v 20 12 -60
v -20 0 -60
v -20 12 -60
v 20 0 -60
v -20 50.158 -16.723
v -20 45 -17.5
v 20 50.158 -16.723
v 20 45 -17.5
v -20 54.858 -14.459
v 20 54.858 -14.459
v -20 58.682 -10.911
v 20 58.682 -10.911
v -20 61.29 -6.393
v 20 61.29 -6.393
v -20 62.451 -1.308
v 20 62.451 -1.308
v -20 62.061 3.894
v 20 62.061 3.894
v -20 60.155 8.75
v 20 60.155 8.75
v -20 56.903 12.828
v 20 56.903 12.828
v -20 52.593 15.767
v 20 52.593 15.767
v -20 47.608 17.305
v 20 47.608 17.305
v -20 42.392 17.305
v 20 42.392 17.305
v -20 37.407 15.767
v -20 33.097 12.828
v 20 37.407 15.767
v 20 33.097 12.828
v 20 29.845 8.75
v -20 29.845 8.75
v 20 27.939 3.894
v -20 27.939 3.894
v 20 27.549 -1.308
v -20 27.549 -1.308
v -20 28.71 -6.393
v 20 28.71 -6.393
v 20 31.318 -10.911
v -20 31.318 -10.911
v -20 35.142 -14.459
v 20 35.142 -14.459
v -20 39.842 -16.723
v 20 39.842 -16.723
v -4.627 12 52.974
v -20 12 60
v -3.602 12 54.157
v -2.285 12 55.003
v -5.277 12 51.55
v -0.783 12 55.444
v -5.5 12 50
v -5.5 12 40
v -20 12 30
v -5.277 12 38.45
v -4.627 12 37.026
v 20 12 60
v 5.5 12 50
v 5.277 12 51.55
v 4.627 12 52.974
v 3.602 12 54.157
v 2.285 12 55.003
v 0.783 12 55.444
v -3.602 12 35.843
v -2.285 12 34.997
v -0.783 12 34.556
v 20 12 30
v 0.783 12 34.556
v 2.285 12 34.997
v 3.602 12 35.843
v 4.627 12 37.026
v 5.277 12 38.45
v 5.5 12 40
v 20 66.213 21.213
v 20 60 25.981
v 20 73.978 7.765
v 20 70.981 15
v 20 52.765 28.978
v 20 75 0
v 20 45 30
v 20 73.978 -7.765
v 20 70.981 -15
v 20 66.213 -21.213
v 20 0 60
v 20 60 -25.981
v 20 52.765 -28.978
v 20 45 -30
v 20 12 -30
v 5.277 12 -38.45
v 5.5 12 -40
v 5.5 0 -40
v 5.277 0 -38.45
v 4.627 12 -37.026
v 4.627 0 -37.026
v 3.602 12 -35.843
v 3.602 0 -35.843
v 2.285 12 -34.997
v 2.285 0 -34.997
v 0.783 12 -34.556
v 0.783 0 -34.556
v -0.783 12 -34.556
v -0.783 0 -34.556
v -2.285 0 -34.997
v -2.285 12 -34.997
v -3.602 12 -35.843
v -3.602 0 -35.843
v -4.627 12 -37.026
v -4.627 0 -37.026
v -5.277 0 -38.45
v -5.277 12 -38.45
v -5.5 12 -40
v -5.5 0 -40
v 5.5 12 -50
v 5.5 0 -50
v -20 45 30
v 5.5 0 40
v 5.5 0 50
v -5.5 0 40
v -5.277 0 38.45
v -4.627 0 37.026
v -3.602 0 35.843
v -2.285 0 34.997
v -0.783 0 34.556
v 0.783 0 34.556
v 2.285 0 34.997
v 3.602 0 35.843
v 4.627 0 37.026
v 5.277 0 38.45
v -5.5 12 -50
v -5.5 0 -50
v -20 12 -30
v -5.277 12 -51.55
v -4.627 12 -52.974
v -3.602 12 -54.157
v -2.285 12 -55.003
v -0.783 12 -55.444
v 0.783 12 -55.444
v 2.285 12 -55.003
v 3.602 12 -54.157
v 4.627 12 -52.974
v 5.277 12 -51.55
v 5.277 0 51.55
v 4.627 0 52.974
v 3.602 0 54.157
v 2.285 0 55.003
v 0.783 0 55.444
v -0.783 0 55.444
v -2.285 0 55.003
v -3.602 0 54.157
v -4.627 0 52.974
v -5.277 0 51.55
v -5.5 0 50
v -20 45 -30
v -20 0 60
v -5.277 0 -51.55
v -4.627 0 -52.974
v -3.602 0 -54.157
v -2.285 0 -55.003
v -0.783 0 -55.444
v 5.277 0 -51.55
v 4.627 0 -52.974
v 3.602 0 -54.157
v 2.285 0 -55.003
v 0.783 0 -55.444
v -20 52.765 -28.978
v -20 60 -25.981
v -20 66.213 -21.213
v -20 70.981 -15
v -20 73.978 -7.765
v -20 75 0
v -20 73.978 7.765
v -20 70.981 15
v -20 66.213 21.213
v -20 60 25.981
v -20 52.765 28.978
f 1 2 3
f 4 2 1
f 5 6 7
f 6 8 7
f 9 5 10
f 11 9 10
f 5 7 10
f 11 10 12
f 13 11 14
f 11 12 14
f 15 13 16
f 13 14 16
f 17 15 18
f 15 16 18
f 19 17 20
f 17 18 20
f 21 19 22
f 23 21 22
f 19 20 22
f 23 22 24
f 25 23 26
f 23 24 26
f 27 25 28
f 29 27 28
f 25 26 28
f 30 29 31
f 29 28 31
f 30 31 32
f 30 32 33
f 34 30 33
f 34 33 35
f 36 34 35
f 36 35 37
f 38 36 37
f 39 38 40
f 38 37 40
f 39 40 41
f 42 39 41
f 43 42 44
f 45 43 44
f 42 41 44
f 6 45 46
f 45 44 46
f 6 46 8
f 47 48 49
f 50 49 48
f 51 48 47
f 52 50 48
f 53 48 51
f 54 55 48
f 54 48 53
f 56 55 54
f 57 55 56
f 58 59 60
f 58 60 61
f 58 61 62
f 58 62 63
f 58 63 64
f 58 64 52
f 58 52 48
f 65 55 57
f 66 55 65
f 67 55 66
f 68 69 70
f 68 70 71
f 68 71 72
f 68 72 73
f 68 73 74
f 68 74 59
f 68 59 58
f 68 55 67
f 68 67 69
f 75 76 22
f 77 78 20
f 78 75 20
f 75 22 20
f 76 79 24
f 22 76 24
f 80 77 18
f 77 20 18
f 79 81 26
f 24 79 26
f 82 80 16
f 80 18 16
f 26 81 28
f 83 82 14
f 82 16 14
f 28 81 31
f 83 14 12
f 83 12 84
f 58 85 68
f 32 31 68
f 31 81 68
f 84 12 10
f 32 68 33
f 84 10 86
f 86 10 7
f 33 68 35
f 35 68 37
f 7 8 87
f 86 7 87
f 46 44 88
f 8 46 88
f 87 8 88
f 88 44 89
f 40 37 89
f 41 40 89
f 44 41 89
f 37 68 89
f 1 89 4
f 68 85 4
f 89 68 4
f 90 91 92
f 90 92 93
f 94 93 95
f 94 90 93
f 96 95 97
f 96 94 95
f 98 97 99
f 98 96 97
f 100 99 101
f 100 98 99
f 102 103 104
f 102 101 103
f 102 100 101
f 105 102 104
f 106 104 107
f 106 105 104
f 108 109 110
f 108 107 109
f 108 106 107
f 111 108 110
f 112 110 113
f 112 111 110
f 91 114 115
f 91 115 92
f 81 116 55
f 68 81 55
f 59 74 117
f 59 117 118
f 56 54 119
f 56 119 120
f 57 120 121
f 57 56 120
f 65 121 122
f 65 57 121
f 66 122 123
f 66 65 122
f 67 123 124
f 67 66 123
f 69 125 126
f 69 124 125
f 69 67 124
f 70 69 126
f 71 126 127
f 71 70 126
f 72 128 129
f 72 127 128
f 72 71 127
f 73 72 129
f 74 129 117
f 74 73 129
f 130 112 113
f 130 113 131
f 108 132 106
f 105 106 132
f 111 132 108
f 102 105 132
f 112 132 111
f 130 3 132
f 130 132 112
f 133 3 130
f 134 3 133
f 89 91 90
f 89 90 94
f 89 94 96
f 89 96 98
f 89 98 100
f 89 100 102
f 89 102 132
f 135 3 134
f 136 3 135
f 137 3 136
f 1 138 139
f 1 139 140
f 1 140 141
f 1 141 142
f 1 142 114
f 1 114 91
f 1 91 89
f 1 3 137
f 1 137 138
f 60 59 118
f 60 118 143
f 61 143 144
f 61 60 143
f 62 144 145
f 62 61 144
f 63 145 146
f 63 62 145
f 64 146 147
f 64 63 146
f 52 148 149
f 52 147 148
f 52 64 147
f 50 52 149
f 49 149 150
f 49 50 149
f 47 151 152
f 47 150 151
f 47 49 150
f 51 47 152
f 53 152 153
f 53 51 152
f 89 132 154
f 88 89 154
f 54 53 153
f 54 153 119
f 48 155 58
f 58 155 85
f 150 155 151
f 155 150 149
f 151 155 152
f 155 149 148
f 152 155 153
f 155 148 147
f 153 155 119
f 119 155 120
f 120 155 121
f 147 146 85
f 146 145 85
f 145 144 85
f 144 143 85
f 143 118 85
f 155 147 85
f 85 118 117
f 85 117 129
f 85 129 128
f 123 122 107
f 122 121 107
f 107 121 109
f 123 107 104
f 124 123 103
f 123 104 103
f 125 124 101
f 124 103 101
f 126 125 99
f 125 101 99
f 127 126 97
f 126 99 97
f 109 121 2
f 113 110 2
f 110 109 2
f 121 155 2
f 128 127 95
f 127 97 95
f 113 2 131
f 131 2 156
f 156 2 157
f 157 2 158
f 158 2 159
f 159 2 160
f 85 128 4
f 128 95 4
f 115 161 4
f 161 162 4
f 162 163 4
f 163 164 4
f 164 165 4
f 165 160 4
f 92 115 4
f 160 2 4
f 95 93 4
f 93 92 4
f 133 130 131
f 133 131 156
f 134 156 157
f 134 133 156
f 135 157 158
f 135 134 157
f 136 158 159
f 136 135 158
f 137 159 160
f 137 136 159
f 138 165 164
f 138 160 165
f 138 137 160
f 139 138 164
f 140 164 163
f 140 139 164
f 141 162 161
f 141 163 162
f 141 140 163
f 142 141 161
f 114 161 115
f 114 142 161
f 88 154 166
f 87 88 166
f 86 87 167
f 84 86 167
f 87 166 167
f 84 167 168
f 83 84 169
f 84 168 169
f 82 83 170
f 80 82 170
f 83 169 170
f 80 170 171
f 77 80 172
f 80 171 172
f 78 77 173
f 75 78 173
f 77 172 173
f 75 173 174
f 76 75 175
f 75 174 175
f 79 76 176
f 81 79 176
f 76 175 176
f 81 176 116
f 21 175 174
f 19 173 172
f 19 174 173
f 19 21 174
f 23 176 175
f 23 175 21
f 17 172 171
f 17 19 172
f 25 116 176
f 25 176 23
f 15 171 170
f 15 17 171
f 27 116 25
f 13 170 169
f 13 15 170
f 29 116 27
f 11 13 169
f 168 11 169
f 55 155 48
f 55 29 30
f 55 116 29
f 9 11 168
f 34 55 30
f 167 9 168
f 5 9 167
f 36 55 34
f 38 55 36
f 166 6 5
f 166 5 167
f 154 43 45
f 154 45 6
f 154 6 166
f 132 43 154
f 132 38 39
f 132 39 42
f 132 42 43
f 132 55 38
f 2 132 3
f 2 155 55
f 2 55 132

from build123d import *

# Parameters (mm, degrees)
SKETCH_1_W          = 40
SKETCH_1_H          = 120
EXTRUDE_1_DEPTH     = 12
EXTRUDE_2_DEPTH     = 40
SKETCH_3_R          = 17.5
CUT_EXTRUDE_1_DEPTH = 121
CUT_EXTRUDE_2_DEPTH = 90.269255626


with BuildPart() as part:
    # 草图1 → 凸台-拉伸1 (new body)
    with BuildSketch(Plane(origin=(0, 0, 0), x_dir=(1, 0, 0), z_dir=(0, 1, 0))):
        Rectangle(SKETCH_1_W, SKETCH_1_H)
    extrude(amount=EXTRUDE_1_DEPTH)

    # 草图2 → 凸台-拉伸2 (add)
    with BuildSketch(Plane(origin=(-20, 0, 0), x_dir=(0, 0, -1), z_dir=(1, 0, 0))):
        with BuildLine():
            Line((30, 10), (30, 45))
            ThreePointArc((30, 45), (0, 75), (-30, 45))
            Line((-30, 45), (-30, 10))
            Line((-30, 10), (30, 10))
        make_face()
    extrude(amount=EXTRUDE_2_DEPTH)

    # 草图3 → 切除-拉伸1 (cut, symmetric)
    with BuildSketch(Plane(origin=(0, 0, 0), x_dir=(0, 0, -1), z_dir=(1, 0, 0))):
        with Locations((0, 45)):
            Circle(SKETCH_3_R)
    extrude(amount=CUT_EXTRUDE_1_DEPTH, both=True, mode=Mode.SUBTRACT)

    # 草图4 → 切除-拉伸2 (cut, through all)
    with BuildSketch(Plane(origin=(0, 12, 0), x_dir=(1, 0, 0), z_dir=(0, 1, 0))):
        with BuildLine():
            Line((5.5, -40), (5.5, -50))
            ThreePointArc((5.5, -50), (0, -55.5), (-5.5, -50))
            Line((-5.5, -50), (-5.5, -40))
            ThreePointArc((-5.5, -40), (0, -34.5), (5.5, -40))
        make_face()
        with BuildLine():
            Line((5.5, 50), (5.5, 40))
            ThreePointArc((5.5, 40), (0, 34.5), (-5.5, 40))
            Line((-5.5, 40), (-5.5, 50))
            ThreePointArc((-5.5, 50), (0, 55.5), (5.5, 50))
        make_face()
    extrude(amount=-CUT_EXTRUDE_2_DEPTH, mode=Mode.SUBTRACT)


solid = part.part
